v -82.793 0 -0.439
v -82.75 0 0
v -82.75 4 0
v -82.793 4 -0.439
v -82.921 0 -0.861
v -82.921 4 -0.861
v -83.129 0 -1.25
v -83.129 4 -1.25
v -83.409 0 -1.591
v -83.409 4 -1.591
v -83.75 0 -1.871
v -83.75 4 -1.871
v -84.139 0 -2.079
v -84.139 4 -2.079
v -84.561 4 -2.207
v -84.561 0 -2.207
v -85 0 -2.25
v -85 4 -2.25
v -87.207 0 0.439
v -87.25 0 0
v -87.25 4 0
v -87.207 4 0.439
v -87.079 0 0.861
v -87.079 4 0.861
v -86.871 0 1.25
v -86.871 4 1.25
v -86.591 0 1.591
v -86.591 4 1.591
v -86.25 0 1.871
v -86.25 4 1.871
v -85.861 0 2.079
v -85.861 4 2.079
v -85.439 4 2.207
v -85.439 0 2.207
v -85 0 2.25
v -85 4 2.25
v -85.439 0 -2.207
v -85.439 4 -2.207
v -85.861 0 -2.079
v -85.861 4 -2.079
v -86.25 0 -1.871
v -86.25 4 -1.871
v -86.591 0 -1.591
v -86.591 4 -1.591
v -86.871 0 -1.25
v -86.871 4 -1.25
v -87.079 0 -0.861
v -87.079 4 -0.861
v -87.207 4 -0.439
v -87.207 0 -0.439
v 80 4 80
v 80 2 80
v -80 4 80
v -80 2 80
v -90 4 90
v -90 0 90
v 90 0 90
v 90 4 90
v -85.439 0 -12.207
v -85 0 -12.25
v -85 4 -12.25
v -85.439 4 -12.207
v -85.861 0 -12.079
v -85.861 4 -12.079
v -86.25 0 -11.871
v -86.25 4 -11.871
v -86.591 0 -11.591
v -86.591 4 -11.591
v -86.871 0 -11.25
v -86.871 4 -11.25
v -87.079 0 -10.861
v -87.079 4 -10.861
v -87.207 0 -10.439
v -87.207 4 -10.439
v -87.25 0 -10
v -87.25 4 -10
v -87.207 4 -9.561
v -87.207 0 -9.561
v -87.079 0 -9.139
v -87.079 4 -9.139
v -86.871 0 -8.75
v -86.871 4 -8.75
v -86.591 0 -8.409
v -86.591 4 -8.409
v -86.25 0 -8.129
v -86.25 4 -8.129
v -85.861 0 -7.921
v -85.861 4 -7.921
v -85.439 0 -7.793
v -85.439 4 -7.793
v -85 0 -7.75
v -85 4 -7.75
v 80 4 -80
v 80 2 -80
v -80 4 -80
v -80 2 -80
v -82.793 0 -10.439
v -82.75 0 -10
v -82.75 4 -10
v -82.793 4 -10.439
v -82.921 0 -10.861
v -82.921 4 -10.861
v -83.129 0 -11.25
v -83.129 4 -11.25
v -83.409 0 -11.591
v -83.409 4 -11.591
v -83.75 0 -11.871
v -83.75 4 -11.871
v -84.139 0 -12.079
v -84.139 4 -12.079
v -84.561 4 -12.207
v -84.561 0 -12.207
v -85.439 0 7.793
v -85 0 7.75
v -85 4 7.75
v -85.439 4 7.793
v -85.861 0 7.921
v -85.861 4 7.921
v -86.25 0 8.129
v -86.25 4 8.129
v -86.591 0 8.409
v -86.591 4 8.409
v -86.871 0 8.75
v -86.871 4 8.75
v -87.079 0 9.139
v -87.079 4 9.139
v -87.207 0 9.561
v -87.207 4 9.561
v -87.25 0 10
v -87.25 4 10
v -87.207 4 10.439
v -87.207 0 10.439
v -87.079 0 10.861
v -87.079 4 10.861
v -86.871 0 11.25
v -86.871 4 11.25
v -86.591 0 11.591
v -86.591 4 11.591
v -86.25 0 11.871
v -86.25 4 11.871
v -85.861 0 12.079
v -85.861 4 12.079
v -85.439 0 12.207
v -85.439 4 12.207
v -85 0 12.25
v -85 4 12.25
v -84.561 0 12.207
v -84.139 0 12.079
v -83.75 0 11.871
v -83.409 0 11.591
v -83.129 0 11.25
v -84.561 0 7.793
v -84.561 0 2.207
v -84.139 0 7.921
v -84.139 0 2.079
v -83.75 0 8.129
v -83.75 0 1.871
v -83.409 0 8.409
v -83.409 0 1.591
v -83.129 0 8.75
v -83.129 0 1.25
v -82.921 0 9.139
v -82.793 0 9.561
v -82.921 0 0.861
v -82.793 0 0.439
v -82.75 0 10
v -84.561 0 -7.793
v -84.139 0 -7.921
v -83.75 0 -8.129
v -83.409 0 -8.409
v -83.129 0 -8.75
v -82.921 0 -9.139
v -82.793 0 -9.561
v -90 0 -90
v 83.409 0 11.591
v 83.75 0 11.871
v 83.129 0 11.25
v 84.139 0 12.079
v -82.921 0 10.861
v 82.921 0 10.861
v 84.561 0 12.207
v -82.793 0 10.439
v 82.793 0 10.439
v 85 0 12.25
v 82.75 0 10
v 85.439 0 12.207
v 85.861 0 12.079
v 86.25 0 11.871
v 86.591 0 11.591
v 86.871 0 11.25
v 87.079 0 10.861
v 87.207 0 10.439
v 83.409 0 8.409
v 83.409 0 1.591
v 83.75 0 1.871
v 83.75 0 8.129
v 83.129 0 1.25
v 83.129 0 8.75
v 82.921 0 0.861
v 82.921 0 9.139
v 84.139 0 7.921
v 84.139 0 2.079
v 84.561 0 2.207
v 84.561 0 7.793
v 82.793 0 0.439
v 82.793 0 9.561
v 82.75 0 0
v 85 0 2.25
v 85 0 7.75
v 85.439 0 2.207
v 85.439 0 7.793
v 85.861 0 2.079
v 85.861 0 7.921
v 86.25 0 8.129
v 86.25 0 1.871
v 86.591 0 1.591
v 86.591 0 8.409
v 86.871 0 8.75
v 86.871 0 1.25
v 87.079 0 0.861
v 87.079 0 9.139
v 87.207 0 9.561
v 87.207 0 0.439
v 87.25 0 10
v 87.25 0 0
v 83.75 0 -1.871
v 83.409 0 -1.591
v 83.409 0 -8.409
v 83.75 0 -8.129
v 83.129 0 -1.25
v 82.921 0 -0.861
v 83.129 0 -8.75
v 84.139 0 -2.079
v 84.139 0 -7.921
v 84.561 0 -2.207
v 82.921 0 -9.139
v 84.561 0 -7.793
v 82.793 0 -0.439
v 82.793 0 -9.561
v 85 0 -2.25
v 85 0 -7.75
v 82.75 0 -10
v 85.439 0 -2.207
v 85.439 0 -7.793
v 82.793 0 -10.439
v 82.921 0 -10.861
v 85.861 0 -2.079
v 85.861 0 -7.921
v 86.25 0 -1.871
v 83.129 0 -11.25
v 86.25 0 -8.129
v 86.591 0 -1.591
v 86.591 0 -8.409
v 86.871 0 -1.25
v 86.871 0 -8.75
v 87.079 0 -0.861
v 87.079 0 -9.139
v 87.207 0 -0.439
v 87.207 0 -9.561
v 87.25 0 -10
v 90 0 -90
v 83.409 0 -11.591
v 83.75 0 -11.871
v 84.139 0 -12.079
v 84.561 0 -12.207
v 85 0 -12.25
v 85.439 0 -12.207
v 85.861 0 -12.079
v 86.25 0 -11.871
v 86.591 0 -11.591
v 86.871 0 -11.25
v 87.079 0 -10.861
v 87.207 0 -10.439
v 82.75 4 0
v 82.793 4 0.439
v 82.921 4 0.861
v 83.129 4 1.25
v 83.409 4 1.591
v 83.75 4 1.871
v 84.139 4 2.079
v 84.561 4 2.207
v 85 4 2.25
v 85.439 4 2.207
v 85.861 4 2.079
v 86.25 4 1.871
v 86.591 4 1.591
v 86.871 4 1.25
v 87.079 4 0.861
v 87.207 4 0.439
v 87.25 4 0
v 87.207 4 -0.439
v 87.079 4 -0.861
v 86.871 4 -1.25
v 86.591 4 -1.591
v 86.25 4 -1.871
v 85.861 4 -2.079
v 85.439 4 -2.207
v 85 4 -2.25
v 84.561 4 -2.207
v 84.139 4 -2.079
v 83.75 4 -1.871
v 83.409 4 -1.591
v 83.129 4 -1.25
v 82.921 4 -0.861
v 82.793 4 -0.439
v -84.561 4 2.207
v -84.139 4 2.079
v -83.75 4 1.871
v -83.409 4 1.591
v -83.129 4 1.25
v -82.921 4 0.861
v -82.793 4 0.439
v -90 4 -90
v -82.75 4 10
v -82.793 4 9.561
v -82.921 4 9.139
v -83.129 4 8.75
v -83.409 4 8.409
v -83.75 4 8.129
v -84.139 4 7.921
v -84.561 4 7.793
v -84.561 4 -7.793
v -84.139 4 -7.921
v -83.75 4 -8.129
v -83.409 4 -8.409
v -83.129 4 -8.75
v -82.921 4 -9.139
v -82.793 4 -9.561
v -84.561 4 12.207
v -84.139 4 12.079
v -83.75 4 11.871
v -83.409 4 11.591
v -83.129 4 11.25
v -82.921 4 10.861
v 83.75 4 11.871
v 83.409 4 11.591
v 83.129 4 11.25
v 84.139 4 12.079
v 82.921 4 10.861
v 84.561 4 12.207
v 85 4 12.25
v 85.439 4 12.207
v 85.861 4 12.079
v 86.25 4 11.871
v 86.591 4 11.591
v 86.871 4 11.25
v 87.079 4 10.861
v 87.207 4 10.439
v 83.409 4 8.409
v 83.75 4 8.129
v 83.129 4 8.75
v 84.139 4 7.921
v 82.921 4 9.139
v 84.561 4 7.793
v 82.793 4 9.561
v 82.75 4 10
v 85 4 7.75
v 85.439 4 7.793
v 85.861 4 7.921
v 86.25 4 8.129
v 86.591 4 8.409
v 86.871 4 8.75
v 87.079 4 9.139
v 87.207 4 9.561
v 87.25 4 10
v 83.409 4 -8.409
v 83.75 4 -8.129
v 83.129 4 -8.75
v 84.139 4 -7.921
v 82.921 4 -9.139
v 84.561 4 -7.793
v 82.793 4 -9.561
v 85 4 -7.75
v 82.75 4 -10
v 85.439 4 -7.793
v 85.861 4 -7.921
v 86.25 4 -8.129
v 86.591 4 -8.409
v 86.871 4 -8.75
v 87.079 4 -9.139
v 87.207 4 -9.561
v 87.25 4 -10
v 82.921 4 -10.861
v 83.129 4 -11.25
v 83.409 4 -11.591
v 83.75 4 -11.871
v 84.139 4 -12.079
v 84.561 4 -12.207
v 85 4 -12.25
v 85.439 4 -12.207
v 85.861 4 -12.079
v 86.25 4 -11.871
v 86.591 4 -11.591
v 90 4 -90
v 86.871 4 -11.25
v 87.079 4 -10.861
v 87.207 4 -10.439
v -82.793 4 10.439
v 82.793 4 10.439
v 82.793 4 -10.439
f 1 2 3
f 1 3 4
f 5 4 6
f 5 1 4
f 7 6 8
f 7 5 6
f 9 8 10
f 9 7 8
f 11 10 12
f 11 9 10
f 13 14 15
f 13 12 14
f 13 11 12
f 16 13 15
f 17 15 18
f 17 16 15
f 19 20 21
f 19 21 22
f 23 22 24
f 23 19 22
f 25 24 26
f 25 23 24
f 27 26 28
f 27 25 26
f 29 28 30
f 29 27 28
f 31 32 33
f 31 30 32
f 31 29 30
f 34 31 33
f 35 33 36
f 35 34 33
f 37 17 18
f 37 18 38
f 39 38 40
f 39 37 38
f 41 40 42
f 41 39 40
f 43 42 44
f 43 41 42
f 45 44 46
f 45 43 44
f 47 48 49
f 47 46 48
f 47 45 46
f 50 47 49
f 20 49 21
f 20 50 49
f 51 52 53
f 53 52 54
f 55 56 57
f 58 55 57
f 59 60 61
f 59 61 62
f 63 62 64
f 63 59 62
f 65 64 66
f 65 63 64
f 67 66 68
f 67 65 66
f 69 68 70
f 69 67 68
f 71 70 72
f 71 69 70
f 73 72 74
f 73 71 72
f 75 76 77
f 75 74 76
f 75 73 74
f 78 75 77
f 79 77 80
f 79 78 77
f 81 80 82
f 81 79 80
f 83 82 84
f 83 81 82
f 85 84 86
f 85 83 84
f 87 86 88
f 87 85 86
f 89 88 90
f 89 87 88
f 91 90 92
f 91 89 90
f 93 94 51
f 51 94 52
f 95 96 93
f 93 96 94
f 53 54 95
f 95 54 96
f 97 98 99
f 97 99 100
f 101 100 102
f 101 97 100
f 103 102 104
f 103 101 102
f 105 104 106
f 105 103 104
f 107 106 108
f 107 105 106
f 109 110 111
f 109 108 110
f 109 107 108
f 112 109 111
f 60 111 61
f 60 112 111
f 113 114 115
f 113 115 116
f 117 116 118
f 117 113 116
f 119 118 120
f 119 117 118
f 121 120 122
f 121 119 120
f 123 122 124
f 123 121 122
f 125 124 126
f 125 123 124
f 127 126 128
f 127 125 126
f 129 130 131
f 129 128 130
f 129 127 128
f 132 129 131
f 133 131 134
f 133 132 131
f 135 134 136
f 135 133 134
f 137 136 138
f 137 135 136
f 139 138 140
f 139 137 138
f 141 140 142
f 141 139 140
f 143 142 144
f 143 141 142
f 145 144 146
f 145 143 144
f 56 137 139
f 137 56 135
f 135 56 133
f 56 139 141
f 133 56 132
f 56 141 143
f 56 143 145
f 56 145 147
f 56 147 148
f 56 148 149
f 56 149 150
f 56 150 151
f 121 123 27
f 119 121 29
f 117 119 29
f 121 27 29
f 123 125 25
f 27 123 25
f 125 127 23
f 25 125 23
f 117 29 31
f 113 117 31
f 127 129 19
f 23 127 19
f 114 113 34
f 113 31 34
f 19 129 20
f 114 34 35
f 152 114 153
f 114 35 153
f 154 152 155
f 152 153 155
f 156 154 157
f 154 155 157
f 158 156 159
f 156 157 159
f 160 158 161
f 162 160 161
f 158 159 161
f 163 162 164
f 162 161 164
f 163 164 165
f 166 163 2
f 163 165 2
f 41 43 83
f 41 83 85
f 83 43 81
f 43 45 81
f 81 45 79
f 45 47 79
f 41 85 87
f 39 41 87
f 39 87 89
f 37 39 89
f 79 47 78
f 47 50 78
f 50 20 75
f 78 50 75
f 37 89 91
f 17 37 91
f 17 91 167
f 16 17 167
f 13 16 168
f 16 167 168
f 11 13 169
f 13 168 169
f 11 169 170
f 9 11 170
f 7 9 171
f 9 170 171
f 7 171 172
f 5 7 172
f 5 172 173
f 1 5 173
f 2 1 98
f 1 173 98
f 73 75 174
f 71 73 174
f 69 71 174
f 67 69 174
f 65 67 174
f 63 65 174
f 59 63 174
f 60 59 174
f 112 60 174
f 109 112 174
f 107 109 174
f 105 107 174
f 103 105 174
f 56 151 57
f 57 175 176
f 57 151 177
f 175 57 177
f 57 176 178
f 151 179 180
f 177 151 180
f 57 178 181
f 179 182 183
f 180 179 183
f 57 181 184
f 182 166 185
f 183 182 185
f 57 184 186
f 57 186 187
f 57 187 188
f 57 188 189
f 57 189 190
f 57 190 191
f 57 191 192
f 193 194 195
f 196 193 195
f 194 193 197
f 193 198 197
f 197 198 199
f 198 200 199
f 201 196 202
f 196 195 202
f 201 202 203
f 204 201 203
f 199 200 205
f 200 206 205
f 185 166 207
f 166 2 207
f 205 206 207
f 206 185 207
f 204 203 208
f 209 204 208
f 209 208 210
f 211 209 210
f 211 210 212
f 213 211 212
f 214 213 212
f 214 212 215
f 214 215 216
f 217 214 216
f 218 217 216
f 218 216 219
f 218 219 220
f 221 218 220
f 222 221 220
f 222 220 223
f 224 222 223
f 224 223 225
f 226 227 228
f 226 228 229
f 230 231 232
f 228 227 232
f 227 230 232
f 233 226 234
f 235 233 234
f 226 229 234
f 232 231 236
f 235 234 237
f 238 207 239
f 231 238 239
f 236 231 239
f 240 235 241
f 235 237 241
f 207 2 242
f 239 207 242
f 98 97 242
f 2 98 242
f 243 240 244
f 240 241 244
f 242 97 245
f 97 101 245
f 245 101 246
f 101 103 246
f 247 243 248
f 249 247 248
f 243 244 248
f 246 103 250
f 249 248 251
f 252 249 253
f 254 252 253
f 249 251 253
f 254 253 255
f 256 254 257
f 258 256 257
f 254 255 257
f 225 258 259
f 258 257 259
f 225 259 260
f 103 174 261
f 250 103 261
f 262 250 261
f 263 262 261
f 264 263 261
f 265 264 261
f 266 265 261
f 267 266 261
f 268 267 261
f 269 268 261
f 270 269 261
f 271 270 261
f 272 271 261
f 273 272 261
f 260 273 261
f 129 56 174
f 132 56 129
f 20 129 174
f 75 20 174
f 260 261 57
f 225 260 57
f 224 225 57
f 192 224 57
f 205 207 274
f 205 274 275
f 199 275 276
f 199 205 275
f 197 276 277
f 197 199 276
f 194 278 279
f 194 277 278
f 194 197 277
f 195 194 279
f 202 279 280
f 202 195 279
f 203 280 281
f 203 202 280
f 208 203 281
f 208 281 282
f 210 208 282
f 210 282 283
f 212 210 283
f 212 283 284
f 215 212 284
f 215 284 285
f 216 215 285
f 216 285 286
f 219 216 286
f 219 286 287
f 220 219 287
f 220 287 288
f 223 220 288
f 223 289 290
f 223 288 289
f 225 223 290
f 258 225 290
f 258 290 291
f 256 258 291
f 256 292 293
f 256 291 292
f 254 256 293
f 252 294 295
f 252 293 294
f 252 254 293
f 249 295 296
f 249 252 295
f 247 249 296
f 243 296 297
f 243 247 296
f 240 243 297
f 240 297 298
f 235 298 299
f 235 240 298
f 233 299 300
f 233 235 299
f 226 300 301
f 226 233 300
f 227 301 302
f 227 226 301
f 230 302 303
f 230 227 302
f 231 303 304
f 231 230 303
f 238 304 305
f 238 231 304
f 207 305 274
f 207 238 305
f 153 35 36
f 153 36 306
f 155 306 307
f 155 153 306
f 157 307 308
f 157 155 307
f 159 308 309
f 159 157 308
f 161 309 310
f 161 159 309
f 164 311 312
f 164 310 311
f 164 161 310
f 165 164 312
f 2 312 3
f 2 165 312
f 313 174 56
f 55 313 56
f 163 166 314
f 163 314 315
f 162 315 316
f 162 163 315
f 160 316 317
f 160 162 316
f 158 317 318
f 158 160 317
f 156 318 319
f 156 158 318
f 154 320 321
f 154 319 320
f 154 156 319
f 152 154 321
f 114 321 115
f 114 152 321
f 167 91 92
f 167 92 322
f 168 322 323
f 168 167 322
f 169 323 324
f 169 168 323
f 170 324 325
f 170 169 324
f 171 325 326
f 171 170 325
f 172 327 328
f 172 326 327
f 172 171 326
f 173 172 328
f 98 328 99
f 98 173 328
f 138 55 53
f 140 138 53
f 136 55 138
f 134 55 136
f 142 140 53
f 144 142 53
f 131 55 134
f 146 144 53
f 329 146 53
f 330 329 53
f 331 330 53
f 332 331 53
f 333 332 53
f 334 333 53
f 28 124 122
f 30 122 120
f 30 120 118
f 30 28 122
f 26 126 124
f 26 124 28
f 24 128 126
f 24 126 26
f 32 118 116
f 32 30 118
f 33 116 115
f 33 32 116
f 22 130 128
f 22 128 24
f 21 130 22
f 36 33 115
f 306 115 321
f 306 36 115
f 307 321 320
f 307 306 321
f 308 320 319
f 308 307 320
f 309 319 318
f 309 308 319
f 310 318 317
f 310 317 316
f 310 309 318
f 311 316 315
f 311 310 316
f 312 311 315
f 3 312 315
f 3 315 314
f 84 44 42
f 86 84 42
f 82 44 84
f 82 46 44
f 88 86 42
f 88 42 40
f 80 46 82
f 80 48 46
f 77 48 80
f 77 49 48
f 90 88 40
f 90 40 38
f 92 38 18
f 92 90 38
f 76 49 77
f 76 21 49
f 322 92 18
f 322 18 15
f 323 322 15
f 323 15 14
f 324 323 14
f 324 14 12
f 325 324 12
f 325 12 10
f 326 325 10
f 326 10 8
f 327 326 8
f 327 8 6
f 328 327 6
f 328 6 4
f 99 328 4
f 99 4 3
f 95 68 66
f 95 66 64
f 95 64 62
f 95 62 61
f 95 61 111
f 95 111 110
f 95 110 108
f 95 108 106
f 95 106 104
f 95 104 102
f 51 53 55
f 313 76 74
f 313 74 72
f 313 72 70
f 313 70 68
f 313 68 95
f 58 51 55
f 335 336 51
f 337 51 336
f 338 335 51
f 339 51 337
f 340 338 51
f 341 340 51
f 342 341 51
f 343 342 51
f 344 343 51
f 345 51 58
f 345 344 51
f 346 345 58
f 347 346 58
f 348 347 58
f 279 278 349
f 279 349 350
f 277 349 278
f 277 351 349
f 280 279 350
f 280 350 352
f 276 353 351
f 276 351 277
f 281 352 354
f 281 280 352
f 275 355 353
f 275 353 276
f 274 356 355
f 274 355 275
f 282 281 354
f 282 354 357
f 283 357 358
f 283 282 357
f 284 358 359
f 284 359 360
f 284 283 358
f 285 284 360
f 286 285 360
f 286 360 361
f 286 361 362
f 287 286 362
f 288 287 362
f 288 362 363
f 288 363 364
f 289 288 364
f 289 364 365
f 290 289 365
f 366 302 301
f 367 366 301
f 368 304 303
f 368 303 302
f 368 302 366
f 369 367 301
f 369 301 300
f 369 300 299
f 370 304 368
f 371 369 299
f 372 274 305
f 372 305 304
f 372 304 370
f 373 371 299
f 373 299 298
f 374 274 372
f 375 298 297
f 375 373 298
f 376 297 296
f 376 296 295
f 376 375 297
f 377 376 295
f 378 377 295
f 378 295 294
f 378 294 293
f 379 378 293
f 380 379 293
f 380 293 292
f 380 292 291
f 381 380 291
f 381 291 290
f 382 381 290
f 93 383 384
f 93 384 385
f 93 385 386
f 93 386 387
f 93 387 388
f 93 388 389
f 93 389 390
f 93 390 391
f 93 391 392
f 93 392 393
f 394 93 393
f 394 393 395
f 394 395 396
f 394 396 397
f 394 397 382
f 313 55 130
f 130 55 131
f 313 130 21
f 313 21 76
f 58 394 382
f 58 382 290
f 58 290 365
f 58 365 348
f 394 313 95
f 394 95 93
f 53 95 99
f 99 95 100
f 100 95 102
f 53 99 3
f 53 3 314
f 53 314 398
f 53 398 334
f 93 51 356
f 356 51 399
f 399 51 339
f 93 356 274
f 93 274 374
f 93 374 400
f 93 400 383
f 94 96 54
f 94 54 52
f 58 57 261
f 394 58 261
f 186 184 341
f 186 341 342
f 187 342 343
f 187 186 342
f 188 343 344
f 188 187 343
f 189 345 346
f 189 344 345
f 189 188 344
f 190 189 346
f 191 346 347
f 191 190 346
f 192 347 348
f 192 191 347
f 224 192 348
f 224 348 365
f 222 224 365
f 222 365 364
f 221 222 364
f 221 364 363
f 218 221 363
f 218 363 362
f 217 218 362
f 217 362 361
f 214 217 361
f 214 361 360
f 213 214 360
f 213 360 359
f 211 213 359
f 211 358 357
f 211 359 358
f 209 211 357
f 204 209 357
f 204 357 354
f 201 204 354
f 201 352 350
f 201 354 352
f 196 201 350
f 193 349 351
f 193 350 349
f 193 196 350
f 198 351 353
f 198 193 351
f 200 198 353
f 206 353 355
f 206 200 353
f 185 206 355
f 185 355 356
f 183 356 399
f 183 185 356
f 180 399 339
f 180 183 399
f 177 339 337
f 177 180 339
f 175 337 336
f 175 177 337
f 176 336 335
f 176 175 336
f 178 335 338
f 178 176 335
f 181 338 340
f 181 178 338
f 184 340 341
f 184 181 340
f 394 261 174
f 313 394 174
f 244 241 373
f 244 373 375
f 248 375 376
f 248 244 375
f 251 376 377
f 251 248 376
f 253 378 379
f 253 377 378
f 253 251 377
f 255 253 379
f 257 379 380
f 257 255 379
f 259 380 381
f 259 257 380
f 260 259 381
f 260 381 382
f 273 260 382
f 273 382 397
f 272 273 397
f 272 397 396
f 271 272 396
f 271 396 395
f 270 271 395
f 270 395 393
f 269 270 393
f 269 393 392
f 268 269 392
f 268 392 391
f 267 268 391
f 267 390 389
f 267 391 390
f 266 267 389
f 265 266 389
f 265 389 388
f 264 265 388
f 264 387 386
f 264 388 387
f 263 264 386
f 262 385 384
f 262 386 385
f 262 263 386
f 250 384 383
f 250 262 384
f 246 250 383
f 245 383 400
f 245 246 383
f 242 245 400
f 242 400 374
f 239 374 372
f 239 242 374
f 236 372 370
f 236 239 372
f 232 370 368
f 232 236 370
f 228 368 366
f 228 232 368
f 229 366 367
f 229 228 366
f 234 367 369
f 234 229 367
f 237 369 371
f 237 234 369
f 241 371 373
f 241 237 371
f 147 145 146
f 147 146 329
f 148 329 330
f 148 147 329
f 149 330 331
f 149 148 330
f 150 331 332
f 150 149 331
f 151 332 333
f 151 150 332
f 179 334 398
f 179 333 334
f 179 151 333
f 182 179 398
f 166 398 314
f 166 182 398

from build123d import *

# Parameters (mm, degrees)
EXTRUDE_1_DEPTH          = 2
EXTRUDE_2_DEPTH          = 4
CUT_EXTRUDE_1_DEPTH      = 128.342059038
CUT_EXTRUDE_1_DEPTH_BACK = 128.342059038
SKETCH_3_R               = 2.25


with BuildPart() as part:
    # 草图2 → 凸台-拉伸1 (new body)
    with BuildSketch(Plane(origin=(0, 0, 0), x_dir=(1, 0, 0), z_dir=(0, 1, 0))):
        Polygon((-80, 90), (-90, 90), (-90, -90), (90, -90), (90, 90), align=None)
    extrude(amount=EXTRUDE_1_DEPTH)

    # 草图2<3> → 凸台-拉伸2 (add)
    with BuildSketch(Plane(origin=(0, 0, 0), x_dir=(1, 0, 0), z_dir=(0, 1, 0))):
        Polygon((80, 90), (-80, 90), (-90, 90), (-90, -90), (-80, -90), (90, -90), (90, -80), (90, 90), align=None)
        Polygon((-80, 80), (0, 80), (80, 80), (80, -80), (-80, -80), align=None, mode=Mode.SUBTRACT)
    extrude(amount=EXTRUDE_2_DEPTH)

    # 草图3 → 切除-拉伸1 (cut, two sides: drawn at the far end of the back side and taken through both)
    with BuildSketch(Plane(origin=(0, 4, 0), x_dir=(1, 0, 0), z_dir=(0, 1, 0)).offset(-CUT_EXTRUDE_1_DEPTH_BACK)):
        with Locations((-85, -10)):
            Circle(SKETCH_3_R)
        with Locations((-85, 10)):
            Circle(SKETCH_3_R)
        with Locations((-85, 0)):
            Circle(SKETCH_3_R)
        with Locations((85, 0)):
            Circle(SKETCH_3_R)
        with Locations((85, -10)):
            Circle(SKETCH_3_R)
        with Locations((85, 10)):
            Circle(SKETCH_3_R)
    extrude(amount=CUT_EXTRUDE_1_DEPTH + CUT_EXTRUDE_1_DEPTH_BACK, mode=Mode.SUBTRACT)


solid = part.part
